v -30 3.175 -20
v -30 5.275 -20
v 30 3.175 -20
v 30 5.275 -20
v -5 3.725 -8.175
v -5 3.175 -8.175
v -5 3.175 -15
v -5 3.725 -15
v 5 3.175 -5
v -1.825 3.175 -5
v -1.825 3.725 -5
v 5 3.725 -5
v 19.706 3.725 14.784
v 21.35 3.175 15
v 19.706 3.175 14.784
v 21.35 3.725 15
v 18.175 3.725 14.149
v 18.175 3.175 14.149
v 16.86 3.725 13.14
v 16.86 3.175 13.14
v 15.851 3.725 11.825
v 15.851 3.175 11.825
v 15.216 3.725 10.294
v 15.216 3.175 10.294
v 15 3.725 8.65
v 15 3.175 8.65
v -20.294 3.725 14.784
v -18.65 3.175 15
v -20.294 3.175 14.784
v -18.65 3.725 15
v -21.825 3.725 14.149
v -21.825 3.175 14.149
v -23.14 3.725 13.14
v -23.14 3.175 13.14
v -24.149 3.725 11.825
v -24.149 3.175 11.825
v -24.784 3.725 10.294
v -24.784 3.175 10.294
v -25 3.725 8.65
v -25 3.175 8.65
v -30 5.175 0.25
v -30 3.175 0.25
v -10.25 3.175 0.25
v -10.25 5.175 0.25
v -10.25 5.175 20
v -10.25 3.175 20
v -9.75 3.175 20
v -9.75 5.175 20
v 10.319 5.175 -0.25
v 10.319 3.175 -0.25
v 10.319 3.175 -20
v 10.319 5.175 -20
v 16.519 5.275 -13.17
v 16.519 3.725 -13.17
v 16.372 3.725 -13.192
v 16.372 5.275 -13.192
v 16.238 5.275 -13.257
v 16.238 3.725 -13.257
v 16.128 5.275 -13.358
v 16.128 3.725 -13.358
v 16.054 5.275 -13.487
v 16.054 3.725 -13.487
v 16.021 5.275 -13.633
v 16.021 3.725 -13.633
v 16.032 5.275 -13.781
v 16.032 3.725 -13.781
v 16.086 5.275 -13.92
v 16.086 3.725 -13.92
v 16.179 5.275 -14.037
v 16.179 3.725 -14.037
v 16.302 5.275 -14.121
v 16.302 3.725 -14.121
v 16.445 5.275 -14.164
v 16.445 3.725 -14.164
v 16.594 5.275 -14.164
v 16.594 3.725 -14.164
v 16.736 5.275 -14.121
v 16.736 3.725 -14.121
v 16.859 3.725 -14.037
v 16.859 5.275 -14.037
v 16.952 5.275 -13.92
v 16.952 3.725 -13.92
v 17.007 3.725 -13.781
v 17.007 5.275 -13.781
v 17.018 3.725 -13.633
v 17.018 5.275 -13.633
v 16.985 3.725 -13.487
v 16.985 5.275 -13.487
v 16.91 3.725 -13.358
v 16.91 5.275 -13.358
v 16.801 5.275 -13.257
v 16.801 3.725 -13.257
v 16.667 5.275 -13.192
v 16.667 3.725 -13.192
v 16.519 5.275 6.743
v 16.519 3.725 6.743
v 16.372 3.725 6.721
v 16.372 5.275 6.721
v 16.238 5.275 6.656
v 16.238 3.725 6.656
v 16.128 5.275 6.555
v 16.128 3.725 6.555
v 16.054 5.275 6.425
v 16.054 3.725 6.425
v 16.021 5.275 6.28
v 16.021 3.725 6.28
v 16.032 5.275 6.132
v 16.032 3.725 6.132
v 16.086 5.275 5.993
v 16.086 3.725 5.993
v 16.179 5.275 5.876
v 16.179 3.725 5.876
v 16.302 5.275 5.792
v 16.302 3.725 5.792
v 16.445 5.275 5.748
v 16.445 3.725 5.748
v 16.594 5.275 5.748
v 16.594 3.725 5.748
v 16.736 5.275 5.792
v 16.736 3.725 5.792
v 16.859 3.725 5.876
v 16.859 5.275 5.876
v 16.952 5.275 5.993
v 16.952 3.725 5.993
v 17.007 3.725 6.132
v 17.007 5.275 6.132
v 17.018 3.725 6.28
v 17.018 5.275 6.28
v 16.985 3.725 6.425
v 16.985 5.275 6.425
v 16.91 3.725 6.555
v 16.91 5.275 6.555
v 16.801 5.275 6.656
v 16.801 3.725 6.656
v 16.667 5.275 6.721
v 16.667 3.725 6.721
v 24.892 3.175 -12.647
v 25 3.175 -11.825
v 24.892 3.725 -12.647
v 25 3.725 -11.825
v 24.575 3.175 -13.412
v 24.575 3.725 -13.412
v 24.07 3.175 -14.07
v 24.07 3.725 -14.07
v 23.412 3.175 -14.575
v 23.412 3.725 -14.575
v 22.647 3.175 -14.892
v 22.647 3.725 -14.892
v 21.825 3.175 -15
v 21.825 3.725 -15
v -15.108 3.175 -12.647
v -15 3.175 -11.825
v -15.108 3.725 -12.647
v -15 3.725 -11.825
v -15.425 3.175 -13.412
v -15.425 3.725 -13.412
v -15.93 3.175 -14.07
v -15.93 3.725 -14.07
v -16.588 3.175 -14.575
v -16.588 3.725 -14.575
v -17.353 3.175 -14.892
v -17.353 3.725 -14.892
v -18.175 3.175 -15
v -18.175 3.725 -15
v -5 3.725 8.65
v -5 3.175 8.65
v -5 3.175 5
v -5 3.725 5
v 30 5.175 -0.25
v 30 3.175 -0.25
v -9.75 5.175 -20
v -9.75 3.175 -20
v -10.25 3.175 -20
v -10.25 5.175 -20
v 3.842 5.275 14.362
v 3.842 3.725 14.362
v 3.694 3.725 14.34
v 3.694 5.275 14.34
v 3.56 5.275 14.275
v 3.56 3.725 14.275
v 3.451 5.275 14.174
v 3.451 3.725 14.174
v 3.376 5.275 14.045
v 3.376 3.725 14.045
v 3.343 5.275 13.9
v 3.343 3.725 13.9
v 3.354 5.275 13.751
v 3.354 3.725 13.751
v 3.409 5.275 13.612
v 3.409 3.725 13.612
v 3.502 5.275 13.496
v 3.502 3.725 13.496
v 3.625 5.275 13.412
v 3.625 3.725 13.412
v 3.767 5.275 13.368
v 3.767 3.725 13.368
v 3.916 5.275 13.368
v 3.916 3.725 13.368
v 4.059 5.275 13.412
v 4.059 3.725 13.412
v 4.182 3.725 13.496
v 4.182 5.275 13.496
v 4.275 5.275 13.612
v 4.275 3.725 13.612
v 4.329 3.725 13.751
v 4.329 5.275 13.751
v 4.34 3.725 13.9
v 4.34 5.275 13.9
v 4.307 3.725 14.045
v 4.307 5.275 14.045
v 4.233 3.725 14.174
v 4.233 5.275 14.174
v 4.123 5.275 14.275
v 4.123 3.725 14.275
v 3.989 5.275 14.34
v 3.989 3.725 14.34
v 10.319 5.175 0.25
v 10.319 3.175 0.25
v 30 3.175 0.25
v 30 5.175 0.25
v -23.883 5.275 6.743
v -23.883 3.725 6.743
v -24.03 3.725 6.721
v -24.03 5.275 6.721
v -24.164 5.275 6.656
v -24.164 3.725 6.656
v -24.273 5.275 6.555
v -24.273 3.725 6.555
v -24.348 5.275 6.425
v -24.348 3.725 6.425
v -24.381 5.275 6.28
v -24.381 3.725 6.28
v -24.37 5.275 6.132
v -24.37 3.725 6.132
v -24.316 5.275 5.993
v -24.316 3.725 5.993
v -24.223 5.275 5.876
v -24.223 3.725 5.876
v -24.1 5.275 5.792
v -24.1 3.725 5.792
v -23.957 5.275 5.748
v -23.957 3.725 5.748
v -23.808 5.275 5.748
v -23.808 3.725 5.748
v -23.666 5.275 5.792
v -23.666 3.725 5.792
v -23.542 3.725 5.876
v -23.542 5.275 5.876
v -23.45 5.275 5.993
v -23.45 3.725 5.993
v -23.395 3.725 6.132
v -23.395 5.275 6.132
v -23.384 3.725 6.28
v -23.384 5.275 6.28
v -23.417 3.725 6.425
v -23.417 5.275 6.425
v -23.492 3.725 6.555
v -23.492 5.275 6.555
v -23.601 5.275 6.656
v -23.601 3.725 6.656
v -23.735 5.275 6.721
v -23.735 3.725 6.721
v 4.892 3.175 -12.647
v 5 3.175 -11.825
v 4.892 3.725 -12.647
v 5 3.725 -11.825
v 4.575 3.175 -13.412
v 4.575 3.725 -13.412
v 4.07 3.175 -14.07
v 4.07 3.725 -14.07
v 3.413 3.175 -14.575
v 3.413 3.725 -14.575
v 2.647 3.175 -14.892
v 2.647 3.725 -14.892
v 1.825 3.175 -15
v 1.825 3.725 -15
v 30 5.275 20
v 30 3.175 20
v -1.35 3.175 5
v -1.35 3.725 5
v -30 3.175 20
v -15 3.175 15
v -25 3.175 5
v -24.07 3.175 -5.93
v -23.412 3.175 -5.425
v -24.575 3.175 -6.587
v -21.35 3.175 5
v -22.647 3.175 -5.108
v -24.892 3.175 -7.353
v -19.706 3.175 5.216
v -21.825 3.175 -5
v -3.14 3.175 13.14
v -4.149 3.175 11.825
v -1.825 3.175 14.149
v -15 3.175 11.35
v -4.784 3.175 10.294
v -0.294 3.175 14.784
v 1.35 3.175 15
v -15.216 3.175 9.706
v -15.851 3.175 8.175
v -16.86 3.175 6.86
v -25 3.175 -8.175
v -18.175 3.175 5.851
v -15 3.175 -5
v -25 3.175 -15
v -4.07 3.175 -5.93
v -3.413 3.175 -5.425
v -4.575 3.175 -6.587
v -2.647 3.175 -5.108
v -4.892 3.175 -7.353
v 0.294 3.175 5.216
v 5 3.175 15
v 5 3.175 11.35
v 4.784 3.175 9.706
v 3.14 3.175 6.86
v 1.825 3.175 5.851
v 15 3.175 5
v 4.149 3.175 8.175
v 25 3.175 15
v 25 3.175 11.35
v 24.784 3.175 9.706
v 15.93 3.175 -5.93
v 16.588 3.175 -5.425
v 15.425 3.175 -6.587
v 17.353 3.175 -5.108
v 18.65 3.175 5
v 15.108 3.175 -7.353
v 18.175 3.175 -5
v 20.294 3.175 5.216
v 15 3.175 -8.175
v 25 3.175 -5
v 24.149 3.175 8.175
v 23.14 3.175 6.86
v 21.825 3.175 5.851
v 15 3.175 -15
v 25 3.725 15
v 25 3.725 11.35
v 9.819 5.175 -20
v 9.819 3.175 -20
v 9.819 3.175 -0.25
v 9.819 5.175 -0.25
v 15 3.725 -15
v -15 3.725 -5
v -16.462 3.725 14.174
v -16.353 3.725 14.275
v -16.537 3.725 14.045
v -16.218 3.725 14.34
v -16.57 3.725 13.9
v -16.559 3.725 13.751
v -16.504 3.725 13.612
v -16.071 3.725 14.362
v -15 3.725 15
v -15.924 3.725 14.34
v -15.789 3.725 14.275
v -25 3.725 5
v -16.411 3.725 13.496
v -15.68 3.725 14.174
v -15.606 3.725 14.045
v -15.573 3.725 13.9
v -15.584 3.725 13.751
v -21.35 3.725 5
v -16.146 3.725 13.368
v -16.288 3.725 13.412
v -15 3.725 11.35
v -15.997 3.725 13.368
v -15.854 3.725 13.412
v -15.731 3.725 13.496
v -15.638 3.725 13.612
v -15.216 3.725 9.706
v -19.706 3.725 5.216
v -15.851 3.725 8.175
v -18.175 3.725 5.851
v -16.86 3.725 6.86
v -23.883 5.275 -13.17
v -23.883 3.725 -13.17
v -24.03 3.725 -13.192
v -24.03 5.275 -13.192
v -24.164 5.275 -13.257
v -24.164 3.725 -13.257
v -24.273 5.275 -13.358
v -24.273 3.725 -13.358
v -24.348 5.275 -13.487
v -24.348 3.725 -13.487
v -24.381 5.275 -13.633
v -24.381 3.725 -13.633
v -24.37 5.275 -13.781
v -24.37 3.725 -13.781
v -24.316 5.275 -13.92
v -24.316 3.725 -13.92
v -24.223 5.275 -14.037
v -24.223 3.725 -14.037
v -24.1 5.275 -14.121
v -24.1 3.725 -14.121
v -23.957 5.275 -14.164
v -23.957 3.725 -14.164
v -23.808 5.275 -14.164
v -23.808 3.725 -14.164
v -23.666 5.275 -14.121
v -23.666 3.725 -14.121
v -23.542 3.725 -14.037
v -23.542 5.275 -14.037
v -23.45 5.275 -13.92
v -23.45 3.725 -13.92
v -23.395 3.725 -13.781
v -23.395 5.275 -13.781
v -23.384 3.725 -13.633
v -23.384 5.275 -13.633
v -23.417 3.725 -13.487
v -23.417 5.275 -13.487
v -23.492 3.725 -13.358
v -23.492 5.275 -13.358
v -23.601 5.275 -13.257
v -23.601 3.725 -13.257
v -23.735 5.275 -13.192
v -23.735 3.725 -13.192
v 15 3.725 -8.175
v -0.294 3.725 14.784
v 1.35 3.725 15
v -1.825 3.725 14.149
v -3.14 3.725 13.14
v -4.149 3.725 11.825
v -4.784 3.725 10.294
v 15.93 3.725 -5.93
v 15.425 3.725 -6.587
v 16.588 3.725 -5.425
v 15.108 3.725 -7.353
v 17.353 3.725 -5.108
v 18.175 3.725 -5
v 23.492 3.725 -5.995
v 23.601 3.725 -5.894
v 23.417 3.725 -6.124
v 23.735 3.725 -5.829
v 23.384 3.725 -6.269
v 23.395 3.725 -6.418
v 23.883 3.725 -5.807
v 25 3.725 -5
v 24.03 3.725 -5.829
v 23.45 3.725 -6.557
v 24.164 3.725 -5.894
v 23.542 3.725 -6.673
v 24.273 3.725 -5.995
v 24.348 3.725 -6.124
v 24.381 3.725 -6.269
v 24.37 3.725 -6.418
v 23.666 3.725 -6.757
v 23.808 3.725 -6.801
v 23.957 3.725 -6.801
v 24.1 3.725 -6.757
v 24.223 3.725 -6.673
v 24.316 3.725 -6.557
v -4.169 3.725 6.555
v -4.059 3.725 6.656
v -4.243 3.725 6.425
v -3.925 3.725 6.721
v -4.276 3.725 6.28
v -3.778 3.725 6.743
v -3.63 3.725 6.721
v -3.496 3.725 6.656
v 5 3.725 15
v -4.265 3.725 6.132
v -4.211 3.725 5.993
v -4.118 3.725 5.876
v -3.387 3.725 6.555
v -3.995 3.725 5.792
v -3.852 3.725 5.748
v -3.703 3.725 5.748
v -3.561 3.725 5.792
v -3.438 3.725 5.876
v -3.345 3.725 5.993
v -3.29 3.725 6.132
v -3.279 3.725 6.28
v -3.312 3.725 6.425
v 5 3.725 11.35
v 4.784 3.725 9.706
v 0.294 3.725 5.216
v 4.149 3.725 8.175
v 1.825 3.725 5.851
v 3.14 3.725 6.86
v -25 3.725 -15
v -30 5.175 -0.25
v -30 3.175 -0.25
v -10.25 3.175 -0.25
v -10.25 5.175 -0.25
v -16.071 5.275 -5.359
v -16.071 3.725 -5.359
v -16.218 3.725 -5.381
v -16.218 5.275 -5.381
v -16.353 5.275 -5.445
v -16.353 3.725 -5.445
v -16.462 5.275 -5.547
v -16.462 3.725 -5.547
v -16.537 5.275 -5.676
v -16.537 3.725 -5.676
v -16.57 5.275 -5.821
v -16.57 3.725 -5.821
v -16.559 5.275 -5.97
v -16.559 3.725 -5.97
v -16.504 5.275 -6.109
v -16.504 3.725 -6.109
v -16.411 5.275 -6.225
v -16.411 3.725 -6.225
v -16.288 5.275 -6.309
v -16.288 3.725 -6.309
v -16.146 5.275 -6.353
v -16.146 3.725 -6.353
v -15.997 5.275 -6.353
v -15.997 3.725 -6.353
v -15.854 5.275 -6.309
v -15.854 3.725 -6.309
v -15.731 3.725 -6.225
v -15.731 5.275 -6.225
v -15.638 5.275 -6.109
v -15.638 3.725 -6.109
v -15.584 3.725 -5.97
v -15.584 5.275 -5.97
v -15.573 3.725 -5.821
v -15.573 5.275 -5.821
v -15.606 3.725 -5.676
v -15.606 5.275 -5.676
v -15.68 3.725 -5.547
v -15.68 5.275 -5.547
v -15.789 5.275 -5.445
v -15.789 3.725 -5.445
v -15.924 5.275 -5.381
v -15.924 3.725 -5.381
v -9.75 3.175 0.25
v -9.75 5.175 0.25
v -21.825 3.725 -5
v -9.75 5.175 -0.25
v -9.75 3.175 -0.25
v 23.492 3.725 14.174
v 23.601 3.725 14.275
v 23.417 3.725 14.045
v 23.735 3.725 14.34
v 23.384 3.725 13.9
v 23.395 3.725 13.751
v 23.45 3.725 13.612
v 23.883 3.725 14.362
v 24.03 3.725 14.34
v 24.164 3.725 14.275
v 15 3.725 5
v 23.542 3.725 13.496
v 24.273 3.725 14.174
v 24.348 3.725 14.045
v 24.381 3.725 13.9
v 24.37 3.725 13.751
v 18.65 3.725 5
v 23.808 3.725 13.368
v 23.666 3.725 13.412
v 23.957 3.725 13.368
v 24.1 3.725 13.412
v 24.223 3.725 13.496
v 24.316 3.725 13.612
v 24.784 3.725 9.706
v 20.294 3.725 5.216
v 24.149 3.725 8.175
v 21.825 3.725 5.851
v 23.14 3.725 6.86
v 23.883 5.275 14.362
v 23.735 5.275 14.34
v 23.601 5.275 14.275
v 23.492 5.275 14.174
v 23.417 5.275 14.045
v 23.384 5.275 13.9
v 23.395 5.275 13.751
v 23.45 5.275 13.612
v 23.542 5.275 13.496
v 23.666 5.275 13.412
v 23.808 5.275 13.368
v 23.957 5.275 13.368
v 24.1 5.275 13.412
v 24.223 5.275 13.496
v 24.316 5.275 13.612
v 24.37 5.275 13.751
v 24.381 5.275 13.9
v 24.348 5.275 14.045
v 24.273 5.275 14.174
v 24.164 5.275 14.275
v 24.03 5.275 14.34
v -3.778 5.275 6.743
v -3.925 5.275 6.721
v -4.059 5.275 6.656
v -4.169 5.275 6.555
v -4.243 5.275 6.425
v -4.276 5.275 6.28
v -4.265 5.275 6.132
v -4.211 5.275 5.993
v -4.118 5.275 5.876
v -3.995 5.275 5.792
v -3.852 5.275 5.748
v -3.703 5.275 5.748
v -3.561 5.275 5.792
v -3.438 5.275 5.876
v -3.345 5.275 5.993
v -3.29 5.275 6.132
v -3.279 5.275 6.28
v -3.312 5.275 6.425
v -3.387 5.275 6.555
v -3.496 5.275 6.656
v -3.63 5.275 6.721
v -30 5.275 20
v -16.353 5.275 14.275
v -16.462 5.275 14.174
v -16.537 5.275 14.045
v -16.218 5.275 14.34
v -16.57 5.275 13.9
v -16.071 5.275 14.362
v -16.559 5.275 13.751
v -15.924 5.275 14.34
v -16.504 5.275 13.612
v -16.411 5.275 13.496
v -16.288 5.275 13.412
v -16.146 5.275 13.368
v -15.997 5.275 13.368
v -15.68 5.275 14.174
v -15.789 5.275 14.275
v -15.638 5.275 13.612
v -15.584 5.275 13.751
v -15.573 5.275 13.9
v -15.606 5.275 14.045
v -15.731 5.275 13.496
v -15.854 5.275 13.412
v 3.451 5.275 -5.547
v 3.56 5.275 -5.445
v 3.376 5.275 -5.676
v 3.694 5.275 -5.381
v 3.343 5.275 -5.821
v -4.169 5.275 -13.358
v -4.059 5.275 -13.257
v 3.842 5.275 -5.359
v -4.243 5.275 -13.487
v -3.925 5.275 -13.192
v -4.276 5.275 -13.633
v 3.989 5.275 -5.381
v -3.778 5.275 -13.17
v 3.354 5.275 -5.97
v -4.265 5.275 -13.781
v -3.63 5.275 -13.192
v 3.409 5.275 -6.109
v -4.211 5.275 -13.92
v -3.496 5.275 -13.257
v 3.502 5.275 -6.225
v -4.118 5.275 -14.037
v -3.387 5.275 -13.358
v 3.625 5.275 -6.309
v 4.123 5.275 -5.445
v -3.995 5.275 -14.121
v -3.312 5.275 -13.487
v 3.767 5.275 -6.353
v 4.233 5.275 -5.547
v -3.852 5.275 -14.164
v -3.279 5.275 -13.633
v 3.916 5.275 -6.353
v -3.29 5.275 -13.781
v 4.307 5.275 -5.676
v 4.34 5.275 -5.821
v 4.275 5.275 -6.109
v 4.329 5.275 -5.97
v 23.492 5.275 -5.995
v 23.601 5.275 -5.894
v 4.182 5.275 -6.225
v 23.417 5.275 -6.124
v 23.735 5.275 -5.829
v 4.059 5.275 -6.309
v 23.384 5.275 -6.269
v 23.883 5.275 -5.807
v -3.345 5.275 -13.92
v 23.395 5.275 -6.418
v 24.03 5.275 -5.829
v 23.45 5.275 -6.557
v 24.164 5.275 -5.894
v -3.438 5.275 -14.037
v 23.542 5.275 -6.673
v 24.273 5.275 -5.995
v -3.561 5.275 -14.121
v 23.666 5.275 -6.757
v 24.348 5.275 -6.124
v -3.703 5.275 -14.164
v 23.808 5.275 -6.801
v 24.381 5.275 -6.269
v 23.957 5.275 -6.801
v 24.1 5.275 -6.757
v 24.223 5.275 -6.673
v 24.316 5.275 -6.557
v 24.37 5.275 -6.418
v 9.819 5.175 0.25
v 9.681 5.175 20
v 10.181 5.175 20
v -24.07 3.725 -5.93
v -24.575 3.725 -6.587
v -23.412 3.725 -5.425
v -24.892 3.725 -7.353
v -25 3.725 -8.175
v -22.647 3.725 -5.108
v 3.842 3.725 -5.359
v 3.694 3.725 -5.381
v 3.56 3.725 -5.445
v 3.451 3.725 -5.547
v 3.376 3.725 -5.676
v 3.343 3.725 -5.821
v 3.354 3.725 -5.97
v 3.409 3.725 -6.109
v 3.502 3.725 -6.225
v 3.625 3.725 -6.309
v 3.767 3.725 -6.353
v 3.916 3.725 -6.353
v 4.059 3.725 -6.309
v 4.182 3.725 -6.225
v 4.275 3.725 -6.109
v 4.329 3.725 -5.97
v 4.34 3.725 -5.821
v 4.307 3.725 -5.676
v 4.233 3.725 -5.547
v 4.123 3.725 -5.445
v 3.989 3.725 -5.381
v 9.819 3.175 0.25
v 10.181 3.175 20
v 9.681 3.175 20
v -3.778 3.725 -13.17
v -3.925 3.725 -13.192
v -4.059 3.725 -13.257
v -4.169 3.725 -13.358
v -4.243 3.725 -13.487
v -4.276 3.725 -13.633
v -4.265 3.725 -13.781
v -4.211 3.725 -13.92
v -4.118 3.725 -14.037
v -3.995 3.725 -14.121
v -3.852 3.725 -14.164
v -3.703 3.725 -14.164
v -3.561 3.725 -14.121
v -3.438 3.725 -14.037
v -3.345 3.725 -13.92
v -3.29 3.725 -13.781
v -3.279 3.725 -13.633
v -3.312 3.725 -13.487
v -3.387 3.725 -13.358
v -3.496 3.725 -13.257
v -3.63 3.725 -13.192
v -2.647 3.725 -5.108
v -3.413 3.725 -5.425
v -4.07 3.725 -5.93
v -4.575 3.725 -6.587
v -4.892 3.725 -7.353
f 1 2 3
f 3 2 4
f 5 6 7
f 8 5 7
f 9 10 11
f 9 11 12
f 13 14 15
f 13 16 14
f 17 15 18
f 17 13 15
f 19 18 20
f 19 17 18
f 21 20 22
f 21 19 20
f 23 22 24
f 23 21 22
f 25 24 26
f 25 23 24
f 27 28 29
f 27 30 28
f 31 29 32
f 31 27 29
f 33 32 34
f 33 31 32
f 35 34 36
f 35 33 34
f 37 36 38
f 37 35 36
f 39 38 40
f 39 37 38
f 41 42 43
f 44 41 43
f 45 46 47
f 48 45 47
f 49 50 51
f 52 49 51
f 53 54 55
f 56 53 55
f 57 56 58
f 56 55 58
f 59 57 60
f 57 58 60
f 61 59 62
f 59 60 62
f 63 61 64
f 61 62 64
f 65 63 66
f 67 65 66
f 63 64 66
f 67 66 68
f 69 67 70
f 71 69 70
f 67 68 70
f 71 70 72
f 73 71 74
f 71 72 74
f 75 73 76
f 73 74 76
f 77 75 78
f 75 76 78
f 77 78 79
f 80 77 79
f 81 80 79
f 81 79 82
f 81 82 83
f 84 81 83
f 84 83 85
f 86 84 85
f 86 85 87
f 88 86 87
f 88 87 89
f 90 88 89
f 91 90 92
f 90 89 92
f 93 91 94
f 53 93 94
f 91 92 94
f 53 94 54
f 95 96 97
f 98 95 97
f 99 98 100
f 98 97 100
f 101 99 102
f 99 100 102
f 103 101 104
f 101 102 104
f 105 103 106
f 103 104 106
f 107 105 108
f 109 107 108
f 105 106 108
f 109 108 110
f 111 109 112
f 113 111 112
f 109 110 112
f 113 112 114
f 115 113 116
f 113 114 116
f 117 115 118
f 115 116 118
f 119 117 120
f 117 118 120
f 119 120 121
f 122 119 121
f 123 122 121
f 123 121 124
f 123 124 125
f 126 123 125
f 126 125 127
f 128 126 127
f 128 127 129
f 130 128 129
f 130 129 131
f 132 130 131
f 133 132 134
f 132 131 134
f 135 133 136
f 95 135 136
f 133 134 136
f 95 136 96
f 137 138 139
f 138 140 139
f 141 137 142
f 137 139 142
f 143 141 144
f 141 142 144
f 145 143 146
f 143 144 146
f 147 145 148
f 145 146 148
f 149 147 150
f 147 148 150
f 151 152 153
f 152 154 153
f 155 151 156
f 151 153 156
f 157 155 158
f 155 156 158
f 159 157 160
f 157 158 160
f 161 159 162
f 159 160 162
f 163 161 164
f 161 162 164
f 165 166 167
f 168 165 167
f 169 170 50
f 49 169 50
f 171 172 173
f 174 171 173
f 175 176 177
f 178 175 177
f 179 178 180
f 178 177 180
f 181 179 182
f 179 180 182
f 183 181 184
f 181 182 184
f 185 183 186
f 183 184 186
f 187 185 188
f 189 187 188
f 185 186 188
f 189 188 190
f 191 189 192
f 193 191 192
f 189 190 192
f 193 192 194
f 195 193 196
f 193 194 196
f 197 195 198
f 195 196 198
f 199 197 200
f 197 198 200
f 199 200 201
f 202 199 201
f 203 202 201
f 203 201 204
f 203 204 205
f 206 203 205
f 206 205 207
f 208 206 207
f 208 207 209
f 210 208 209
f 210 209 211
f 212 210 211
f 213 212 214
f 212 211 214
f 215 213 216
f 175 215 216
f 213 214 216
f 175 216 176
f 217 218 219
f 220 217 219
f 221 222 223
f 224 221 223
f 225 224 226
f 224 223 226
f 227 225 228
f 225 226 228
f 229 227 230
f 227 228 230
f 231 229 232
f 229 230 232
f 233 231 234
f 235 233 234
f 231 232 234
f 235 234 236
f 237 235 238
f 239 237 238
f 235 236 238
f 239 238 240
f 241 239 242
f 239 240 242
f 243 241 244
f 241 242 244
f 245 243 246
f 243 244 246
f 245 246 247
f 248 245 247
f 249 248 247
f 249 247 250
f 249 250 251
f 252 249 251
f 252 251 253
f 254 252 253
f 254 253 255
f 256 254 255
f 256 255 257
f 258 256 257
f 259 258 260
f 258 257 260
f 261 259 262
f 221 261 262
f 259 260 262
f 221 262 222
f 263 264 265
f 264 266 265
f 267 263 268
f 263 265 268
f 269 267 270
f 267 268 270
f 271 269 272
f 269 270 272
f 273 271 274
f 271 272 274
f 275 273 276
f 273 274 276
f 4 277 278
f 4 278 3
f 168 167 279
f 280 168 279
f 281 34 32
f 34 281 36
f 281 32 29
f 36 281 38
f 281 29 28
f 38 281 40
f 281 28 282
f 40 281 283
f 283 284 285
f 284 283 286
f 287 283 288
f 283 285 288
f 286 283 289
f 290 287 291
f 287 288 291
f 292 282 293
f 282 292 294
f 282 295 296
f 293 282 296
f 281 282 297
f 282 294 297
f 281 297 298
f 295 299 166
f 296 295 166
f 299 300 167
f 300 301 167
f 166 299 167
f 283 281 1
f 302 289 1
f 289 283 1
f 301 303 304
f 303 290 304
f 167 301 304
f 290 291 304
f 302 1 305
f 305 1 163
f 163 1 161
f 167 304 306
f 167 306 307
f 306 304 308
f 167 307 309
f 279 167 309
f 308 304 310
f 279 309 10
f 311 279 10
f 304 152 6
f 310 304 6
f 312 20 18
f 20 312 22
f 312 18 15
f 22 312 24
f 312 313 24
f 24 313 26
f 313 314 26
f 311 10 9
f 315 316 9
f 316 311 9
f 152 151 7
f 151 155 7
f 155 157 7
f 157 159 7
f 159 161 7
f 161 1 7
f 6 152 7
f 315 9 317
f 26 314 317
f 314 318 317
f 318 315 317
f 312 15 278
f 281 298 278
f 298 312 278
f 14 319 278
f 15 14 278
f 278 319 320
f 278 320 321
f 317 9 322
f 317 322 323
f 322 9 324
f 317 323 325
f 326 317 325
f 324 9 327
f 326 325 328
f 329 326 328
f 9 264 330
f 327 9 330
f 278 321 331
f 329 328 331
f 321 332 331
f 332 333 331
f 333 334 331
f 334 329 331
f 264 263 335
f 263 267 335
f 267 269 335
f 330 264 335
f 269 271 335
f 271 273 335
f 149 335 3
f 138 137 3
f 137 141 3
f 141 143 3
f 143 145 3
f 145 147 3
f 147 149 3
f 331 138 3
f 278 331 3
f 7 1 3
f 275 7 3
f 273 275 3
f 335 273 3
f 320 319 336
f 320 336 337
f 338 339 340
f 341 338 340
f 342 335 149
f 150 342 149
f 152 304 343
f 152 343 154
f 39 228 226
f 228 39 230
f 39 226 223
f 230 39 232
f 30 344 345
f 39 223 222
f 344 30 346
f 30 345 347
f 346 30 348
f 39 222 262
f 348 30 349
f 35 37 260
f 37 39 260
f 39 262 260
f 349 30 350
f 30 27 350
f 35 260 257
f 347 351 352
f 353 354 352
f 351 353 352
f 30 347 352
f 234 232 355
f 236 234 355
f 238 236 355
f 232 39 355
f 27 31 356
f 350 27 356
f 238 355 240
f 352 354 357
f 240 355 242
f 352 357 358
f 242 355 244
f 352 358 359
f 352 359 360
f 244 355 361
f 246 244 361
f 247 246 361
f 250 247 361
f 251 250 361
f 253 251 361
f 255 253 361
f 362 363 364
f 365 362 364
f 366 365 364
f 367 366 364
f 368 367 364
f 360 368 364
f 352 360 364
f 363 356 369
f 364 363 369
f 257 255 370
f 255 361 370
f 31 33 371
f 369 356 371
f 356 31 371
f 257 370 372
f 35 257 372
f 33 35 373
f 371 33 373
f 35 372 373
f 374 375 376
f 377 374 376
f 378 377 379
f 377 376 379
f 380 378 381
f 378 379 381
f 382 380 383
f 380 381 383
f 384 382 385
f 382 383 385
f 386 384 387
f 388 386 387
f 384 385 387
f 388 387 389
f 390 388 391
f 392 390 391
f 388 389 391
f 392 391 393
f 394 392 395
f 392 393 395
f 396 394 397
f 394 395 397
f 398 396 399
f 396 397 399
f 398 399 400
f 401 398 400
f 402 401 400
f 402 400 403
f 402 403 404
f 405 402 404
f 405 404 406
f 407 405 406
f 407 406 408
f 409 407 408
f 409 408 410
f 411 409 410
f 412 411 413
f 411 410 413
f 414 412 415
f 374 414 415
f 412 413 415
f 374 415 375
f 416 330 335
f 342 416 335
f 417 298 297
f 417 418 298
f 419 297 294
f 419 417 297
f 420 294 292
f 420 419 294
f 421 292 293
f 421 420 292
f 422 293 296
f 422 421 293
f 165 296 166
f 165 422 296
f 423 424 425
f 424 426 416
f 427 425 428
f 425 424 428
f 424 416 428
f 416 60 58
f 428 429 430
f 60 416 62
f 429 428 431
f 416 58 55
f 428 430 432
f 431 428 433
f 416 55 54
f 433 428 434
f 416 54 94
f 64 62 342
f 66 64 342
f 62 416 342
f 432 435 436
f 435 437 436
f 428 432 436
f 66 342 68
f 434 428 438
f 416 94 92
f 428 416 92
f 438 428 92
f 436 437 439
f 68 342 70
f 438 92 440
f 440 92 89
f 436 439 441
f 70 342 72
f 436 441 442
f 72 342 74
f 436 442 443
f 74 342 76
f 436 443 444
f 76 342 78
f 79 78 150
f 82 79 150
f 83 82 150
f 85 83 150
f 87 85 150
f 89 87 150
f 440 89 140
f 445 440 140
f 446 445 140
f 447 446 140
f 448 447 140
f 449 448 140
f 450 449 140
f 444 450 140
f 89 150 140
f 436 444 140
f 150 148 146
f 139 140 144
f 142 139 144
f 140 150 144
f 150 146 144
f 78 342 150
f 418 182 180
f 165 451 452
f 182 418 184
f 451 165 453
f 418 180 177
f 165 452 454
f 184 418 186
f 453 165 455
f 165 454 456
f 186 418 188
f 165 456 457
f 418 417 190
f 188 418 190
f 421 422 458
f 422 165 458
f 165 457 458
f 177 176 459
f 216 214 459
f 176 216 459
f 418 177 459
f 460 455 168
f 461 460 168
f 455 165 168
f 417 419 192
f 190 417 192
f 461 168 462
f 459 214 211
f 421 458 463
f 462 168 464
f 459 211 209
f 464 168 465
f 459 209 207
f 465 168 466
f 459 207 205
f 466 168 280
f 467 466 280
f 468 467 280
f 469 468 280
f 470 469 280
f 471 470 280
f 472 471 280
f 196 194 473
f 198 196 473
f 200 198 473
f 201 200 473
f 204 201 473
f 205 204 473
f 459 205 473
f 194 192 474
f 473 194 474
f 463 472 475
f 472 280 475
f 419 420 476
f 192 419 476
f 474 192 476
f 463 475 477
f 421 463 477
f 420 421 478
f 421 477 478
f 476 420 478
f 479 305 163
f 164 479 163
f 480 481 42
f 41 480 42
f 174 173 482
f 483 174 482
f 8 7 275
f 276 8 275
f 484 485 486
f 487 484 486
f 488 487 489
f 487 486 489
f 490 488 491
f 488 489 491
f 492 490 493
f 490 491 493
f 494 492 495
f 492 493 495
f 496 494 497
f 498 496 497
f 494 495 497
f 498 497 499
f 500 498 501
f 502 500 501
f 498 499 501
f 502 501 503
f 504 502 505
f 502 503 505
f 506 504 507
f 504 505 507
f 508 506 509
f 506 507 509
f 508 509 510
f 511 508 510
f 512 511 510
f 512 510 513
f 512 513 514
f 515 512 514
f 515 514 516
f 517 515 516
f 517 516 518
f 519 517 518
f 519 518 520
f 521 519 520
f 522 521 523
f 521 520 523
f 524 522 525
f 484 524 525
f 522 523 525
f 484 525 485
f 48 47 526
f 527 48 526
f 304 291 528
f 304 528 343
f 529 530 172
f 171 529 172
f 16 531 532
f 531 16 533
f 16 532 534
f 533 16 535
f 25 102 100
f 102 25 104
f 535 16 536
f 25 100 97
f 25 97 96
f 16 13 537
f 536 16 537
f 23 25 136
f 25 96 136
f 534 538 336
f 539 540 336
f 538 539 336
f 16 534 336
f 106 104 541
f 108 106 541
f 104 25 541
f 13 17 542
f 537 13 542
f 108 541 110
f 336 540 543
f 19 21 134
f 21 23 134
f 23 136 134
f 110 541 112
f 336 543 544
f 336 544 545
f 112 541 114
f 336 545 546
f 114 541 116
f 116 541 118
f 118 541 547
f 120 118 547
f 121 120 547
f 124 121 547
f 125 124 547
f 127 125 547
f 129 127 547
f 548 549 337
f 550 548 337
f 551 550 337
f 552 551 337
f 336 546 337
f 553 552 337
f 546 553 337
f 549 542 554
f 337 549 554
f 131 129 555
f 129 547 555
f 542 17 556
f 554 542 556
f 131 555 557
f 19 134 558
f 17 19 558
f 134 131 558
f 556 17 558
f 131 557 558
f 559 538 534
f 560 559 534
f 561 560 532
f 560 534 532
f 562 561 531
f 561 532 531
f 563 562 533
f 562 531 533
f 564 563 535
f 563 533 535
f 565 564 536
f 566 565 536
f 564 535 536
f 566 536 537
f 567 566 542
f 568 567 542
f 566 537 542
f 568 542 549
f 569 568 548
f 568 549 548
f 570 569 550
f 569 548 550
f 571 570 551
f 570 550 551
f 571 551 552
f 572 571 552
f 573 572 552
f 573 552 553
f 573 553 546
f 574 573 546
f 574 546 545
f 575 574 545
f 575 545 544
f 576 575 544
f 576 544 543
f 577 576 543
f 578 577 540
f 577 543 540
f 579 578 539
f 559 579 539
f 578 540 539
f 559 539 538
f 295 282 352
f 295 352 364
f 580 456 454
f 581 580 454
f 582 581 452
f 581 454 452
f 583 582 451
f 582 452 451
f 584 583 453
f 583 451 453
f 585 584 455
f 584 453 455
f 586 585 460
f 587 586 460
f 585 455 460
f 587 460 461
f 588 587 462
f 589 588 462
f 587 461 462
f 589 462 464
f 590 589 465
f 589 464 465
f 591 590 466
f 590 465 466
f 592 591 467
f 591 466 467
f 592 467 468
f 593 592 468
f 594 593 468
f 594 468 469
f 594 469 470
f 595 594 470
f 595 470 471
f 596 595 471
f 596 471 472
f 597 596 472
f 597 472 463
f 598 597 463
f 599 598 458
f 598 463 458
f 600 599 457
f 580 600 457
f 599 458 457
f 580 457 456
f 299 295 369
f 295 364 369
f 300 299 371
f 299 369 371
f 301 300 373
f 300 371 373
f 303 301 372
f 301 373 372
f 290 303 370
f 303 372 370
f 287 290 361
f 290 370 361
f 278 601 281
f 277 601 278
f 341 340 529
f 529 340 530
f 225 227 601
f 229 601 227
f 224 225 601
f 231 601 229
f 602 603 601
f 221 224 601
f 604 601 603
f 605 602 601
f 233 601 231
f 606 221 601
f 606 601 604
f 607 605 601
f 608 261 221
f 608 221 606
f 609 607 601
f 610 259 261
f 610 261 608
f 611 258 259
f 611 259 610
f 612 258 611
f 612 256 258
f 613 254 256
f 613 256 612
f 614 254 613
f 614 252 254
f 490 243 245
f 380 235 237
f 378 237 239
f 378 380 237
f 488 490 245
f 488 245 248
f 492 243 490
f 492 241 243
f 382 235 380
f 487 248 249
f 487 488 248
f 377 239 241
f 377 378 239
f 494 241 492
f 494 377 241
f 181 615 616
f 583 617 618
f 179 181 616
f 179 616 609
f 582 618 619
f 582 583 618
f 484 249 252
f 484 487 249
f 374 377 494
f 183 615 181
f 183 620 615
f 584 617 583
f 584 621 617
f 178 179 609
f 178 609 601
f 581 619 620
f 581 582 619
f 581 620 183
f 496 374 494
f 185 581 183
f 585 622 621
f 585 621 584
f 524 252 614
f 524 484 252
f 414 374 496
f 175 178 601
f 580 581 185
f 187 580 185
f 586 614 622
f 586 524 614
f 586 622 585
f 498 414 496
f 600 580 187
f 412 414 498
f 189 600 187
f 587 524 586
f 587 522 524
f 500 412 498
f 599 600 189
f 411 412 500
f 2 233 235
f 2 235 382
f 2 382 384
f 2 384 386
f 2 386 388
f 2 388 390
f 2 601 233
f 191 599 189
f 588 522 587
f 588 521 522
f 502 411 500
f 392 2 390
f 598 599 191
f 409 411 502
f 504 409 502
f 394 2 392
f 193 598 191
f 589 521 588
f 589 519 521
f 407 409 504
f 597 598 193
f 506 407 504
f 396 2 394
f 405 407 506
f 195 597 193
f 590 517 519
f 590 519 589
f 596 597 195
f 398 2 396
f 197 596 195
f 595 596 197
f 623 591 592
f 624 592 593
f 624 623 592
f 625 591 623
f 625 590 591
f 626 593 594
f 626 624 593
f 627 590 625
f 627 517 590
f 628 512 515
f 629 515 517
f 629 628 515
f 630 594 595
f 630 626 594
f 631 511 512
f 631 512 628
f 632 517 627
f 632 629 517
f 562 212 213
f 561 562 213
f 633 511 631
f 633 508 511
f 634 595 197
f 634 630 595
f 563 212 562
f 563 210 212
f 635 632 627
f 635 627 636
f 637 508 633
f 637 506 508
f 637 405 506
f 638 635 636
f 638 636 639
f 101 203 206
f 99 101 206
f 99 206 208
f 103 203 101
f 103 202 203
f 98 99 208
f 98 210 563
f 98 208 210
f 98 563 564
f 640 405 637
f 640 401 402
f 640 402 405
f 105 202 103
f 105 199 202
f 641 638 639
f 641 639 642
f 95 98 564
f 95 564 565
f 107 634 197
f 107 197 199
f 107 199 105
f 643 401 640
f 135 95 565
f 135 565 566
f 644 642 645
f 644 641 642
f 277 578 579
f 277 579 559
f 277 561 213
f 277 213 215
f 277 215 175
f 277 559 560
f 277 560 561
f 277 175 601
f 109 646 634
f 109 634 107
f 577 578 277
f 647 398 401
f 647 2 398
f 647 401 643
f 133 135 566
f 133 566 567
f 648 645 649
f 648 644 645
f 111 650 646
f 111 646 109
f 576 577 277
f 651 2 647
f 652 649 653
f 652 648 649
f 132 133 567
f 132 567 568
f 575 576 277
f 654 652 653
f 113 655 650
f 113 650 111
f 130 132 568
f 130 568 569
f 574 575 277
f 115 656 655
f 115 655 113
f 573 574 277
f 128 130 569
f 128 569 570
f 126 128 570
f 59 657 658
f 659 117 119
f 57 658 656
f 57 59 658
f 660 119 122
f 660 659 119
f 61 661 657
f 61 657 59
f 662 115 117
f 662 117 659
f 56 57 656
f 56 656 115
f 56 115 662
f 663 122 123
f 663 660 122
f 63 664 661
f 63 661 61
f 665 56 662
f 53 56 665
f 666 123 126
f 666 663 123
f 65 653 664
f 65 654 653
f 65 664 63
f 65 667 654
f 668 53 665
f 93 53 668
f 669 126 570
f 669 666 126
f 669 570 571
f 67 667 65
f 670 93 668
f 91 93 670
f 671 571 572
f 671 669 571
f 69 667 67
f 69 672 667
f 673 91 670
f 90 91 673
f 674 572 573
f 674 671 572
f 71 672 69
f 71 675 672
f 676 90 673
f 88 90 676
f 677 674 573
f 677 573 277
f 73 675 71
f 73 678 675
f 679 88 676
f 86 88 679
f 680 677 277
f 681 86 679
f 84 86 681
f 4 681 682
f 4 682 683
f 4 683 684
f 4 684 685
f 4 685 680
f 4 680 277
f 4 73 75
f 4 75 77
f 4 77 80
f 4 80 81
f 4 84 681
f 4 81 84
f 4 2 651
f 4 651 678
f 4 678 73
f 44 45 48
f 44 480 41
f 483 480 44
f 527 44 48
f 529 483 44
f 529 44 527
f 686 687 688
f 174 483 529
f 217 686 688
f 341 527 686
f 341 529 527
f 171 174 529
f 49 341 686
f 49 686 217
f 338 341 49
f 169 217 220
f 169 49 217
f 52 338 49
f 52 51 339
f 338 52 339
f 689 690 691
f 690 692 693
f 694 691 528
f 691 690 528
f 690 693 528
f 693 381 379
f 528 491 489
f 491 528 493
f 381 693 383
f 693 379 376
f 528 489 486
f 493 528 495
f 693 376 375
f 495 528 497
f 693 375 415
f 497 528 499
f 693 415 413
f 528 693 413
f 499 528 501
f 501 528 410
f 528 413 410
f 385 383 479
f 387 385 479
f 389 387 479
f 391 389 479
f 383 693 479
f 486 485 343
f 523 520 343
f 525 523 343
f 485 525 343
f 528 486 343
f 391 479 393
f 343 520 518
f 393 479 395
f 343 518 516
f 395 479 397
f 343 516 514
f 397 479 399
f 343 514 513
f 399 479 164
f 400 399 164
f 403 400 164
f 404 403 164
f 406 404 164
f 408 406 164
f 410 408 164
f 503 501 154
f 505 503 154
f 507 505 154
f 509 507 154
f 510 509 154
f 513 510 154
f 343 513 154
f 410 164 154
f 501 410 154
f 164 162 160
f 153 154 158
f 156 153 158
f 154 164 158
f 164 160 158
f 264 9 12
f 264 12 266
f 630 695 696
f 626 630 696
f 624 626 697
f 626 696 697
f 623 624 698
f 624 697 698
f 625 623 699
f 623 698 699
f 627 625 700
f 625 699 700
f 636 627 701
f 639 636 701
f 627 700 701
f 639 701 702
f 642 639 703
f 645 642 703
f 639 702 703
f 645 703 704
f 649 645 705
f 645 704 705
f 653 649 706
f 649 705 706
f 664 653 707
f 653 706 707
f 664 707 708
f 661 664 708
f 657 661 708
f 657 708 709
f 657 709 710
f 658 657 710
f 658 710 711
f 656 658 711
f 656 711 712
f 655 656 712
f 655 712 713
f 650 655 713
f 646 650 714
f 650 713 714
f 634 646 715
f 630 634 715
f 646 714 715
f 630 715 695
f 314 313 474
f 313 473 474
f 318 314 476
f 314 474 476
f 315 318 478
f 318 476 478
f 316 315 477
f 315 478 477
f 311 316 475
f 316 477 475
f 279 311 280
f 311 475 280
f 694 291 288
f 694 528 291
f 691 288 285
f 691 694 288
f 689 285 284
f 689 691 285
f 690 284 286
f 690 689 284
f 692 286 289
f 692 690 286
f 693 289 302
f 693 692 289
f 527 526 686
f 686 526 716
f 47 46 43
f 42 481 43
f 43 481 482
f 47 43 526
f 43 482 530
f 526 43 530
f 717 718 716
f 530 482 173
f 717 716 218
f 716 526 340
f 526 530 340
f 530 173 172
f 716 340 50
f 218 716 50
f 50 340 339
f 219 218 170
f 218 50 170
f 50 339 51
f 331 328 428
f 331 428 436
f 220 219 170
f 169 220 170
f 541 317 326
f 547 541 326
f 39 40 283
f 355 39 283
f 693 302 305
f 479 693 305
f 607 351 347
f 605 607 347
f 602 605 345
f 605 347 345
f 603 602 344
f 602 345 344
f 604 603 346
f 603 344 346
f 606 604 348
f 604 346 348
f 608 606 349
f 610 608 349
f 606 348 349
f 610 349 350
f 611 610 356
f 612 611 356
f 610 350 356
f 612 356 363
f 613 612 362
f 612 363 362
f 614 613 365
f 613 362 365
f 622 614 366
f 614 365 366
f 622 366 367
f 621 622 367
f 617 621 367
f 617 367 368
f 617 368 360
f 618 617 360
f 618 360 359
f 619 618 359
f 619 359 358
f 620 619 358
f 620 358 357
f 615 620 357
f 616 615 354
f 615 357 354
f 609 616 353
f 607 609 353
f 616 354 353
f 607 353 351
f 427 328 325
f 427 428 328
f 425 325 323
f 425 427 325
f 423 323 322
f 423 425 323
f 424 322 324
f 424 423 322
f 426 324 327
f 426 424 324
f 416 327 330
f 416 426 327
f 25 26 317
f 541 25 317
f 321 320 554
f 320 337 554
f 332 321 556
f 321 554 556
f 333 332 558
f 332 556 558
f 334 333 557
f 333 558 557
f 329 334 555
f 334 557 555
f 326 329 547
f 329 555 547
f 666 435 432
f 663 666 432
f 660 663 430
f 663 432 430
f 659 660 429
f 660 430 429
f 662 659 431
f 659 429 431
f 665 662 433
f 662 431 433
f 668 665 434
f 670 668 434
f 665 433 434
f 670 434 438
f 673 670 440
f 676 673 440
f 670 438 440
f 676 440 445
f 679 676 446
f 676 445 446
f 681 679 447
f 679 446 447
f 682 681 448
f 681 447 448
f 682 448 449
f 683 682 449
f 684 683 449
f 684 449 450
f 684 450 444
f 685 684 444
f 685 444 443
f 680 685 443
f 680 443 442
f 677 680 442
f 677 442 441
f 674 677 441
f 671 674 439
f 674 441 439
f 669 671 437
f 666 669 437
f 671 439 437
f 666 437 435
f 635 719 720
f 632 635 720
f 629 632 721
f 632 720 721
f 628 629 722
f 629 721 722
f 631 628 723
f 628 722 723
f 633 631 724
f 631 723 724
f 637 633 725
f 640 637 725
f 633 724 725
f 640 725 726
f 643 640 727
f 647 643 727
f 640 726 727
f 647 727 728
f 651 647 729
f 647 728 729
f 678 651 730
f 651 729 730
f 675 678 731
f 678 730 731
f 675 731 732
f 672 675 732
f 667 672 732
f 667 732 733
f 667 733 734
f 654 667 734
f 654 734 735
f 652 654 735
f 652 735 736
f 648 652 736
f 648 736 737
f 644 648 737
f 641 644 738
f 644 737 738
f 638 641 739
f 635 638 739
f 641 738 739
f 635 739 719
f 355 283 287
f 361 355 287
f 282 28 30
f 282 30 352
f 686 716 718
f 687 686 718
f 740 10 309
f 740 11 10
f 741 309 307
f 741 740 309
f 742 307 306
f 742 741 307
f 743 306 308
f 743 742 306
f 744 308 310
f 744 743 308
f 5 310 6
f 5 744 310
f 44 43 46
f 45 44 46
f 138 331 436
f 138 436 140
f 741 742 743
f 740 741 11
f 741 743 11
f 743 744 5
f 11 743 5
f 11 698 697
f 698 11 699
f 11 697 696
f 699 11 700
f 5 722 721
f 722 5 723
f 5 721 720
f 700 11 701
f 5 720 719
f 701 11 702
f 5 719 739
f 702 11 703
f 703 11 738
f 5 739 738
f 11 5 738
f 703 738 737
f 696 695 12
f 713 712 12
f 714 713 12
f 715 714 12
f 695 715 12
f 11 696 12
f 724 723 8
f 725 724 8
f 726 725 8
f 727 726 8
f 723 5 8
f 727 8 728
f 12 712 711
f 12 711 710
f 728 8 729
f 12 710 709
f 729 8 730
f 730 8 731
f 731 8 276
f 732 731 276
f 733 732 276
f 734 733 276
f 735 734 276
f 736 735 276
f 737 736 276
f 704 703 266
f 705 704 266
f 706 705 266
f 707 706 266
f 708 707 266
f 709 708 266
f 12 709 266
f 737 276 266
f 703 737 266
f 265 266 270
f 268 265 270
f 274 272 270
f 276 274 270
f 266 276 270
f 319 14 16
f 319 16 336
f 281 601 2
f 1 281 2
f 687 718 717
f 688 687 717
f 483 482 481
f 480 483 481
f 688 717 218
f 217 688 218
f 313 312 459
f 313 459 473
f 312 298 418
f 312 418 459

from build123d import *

# Parameters (mm, degrees)
SKETCH1_W                       = 70
SKETCH1_H                       = 50
BOSS_EXTRUDE1_DEPTH             = 6.35
SKETCH2_W                       = 60
SKETCH2_H                       = 40
CUT_EXTRUDE1_DEPTH              = 3.175
SKETCH3_W                       = 10
SKETCH3_H                       = 10
BOSS_EXTRUDE2_DEPTH             = 0.55
LPATTERN1_COUNT                 = 3
LPATTERN1_PITCH                 = 20
LPATTERN1_COUNT_DIR2            = 2
LPATTERN1_PITCH_DIR2            = 20
DIVIDERS_DEPTH                  = 2
FILLET4_R                       = 3.175
FILLET6_R                       = 3.175
FILLET7_R                       = 6.35
SKETCH11_W                      = 61.55259076
SKETCH11_H                      = 41.010160592
BOSS_EXTRUDE3_DEPTH             = 2.1
SKETCH13_W                      = 0.5
SKETCH13_H                      = 2.1
F_1_0MM_DOWEL_HOLE1_AT_2_COUNT  = 2
F_1_0MM_DOWEL_HOLE1_AT_2_PITCH  = 11.047071486
F_1_0MM_DOWEL_HOLE1_AT_3_COUNT  = 2
F_1_0MM_DOWEL_HOLE1_AT_3_PITCH  = 19.912818023
F_1_0MM_DOWEL_HOLE1_AT_4_COUNT  = 2
F_1_0MM_DOWEL_HOLE1_AT_4_PITCH  = 28.618883578
F_1_0MM_DOWEL_HOLE1_AT_5_COUNT  = 2
F_1_0MM_DOWEL_HOLE1_AT_5_PITCH  = 28.29712794
F_1_0MM_DOWEL_HOLE1_AT_6_COUNT  = 2
F_1_0MM_DOWEL_HOLE1_AT_6_PITCH  = 39.07246023
F_1_0MM_DOWEL_HOLE1_AT_7_COUNT  = 2
F_1_0MM_DOWEL_HOLE1_AT_7_PITCH  = 28.803722668
F_1_0MM_DOWEL_HOLE1_AT_8_COUNT  = 2
F_1_0MM_DOWEL_HOLE1_AT_8_PITCH  = 20.104903085
F_1_0MM_DOWEL_HOLE1_AT_9_COUNT  = 2
F_1_0MM_DOWEL_HOLE1_AT_9_PITCH  = 40.40189123
F_1_0MM_DOWEL_HOLE1_AT_10_COUNT = 2
F_1_0MM_DOWEL_HOLE1_AT_10_PITCH = 48.329363179
F_1_0MM_DOWEL_HOLE1_AT_11_COUNT = 2
F_1_0MM_DOWEL_HOLE1_AT_11_PITCH = 45.042570271
F_1_0MM_DOWEL_HOLE1_AT_12_COUNT = 2
F_1_0MM_DOWEL_HOLE1_AT_12_PITCH = 55.131944827


with BuildPart() as part:
    # Sketch1 → Boss-Extrude1 (new body)
    with BuildSketch(Plane(origin=(0, 0, 0), x_dir=(1, 0, 0), z_dir=(0, 1, 0))):
        Rectangle(SKETCH1_W, SKETCH1_H)
    extrude(amount=BOSS_EXTRUDE1_DEPTH)

    # Sketch2 → Cut-Extrude1 (cut)
    with BuildSketch(Plane(origin=(0, 6.35, 0), x_dir=(1, 0, 0), z_dir=(0, 1, 0))):
        Rectangle(SKETCH2_W, SKETCH2_H)
    extrude(amount=-CUT_EXTRUDE1_DEPTH, mode=Mode.SUBTRACT)

    # Sketch3 → Boss-Extrude2 (add)
    with BuildSketch(Plane(origin=(0, 3.175, 0), x_dir=(1, 0, 0), z_dir=(0, 1, 0))):
        with Locations((-20, 10)):
            Rectangle(SKETCH3_W, SKETCH3_H)
    boss_extrude2 = extrude(amount=BOSS_EXTRUDE2_DEPTH)

    # LPattern1: Boss-Extrude2 3 × 2
    with Locations(*[(i * LPATTERN1_PITCH, 0, j * LPATTERN1_PITCH_DIR2) for i in range(LPATTERN1_COUNT) for j in range(LPATTERN1_COUNT_DIR2) if (i, j) != (0, 0)]):
        add(boss_extrude2)

    # Fillet4
    fillet4_edges = [part.edges().sort_by_distance(p)[0] for p in [
        (35, 3.175, 25),
        (-35, 3.175, 25),
        (-35, 3.175, -25),
        (35, 3.175, -25),
    ]]
    fillet(fillet4_edges, radius=FILLET4_R)

    # Fillet6
    fillet6_edges = [part.edges().sort_by_distance(p)[0] for p in [
        (-15, 3.45, -15),
        (-25, 3.45, -5),
        (5, 3.45, -15),
        (-5, 3.45, -5),
        (25, 3.45, -15),
        (15, 3.45, -5),
    ]]
    fillet(fillet6_edges, radius=FILLET6_R)

    # Fillet7
    fillet7_edges = [part.edges().sort_by_distance(p)[0] for p in [
        (-15, 3.45, 5),
        (-25, 3.45, 15),
        (5, 3.45, 5),
        (-5, 3.45, 15),
        (25, 3.45, 5),
        (15, 3.45, 15),
    ]]
    fillet(fillet7_edges, radius=FILLET7_R)


with BuildPart() as body_2:
    # Sketch10 → Dividers (new body)
    with BuildSketch(Plane(origin=(0, 3.175, 0), x_dir=(1, 0, 0), z_dir=(0, 1, 0))):
        Polygon((-10.25, -0.25), (-10.25, -20), (-9.75, -20), (-9.75, -0.25), (9.818560524, -0.25), (9.681439476, -20), (10.181439476, -20), (10.318560524, -0.25), (30, -0.25), (30, 0.25), (10.318560524, 0.25), (10.318560524, 20), (9.818560524, 20), (9.818560524, 0.25), (-9.75, 0.25), (-9.75, 20), (-10.25, 20), (-10.25, 0.25), (-30, 0.25), (-30, -0.25), align=None)
    extrude(amount=DIVIDERS_DEPTH)


with BuildPart() as body_3:
    # Sketch11 → Boss-Extrude3 (new body)
    with BuildSketch(Plane(origin=(0, 3.175, 0), x_dir=(1, 0, 0), z_dir=(0, 1, 0))):
        Rectangle(SKETCH11_W, SKETCH11_H)
    extrude(amount=BOSS_EXTRUDE3_DEPTH)

    # Combine1: cut part
    add(part.part, mode=Mode.SUBTRACT)

    # Sketch13 → Ø1.0mm Dowel Hole1 (revolve, cut)
    with BuildSketch(Plane(origin=(-23.882575957, 5.275, -13.67005353), x_dir=(0, 0, 1), z_dir=(1, 0, 0))):
        with Locations((0.25, 1.05)):
            Rectangle(SKETCH13_W, SKETCH13_H)
    f_1_0mm_dowel_hole1 = revolve(axis=Axis((-23.882575957, 11.625, -13.67005353), (0, -1, 0)), mode=Mode.SUBTRACT)

    # Ø1.0mm Dowel Hole1 at 2: Ø1.0mm Dowel Hole1 ×2
    with Locations(*[Vector(0.707106781, 0, 0.707106781) * (i * F_1_0MM_DOWEL_HOLE1_AT_2_PITCH) for i in range(1, F_1_0MM_DOWEL_HOLE1_AT_2_COUNT)]):
        add(f_1_0mm_dowel_hole1, mode=Mode.SUBTRACT)

    # Ø1.0mm Dowel Hole1 at 3: Ø1.0mm Dowel Hole1 ×2
    with Locations(*[(0, 0, i * F_1_0MM_DOWEL_HOLE1_AT_3_PITCH) for i in range(1, F_1_0MM_DOWEL_HOLE1_AT_3_COUNT)]):
        add(f_1_0mm_dowel_hole1, mode=Mode.SUBTRACT)

    # Ø1.0mm Dowel Hole1 at 4: Ø1.0mm Dowel Hole1 ×2
    with Locations(*[Vector(0.272947725, 0, 0.962028866) * (i * F_1_0MM_DOWEL_HOLE1_AT_4_PITCH) for i in range(1, F_1_0MM_DOWEL_HOLE1_AT_4_COUNT)]):
        add(f_1_0mm_dowel_hole1, mode=Mode.SUBTRACT)

    # Ø1.0mm Dowel Hole1 at 5: Ø1.0mm Dowel Hole1 ×2
    with Locations(*[Vector(0.710492709, 0, 0.703704562) * (i * F_1_0MM_DOWEL_HOLE1_AT_5_PITCH) for i in range(1, F_1_0MM_DOWEL_HOLE1_AT_5_COUNT)]):
        add(f_1_0mm_dowel_hole1, mode=Mode.SUBTRACT)

    # Ø1.0mm Dowel Hole1 at 6: Ø1.0mm Dowel Hole1 ×2
    with Locations(*[Vector(0.709560571, 0, 0.704644447) * (i * F_1_0MM_DOWEL_HOLE1_AT_6_PITCH) for i in range(1, F_1_0MM_DOWEL_HOLE1_AT_6_COUNT)]):
        add(f_1_0mm_dowel_hole1, mode=Mode.SUBTRACT)

    # Ø1.0mm Dowel Hole1 at 7: Ø1.0mm Dowel Hole1 ×2
    with Locations(*[Vector(0.962524098, 0, 0.271196166) * (i * F_1_0MM_DOWEL_HOLE1_AT_7_PITCH) for i in range(1, F_1_0MM_DOWEL_HOLE1_AT_7_COUNT)]):
        add(f_1_0mm_dowel_hole1, mode=Mode.SUBTRACT)

    # Ø1.0mm Dowel Hole1 at 8: Ø1.0mm Dowel Hole1 ×2
    with Locations(*[(i * F_1_0MM_DOWEL_HOLE1_AT_8_PITCH, 0, 0) for i in range(1, F_1_0MM_DOWEL_HOLE1_AT_8_COUNT)]):
        add(f_1_0mm_dowel_hole1, mode=Mode.SUBTRACT)

    # Ø1.0mm Dowel Hole1 at 9: Ø1.0mm Dowel Hole1 ×2
    with Locations(*[(i * F_1_0MM_DOWEL_HOLE1_AT_9_PITCH, 0, 0) for i in range(1, F_1_0MM_DOWEL_HOLE1_AT_9_COUNT)]):
        add(f_1_0mm_dowel_hole1, mode=Mode.SUBTRACT)

    # Ø1.0mm Dowel Hole1 at 10: Ø1.0mm Dowel Hole1 ×2
    with Locations(*[Vector(0.988325705, 0, 0.152355839) * (i * F_1_0MM_DOWEL_HOLE1_AT_10_PITCH) for i in range(1, F_1_0MM_DOWEL_HOLE1_AT_10_COUNT)]):
        add(f_1_0mm_dowel_hole1, mode=Mode.SUBTRACT)

    # Ø1.0mm Dowel Hole1 at 11: Ø1.0mm Dowel Hole1 ×2
    with Locations(*[Vector(0.896971265, 0, 0.442088848) * (i * F_1_0MM_DOWEL_HOLE1_AT_11_PITCH) for i in range(1, F_1_0MM_DOWEL_HOLE1_AT_11_COUNT)]):
        add(f_1_0mm_dowel_hole1, mode=Mode.SUBTRACT)

    # Ø1.0mm Dowel Hole1 at 12: Ø1.0mm Dowel Hole1 ×2
    with Locations(*[Vector(0.866378867, 0, 0.499387283) * (i * F_1_0MM_DOWEL_HOLE1_AT_12_PITCH) for i in range(1, F_1_0MM_DOWEL_HOLE1_AT_12_COUNT)]):
        add(f_1_0mm_dowel_hole1, mode=Mode.SUBTRACT)


solid = Compound([body_2.part, body_3.part])
